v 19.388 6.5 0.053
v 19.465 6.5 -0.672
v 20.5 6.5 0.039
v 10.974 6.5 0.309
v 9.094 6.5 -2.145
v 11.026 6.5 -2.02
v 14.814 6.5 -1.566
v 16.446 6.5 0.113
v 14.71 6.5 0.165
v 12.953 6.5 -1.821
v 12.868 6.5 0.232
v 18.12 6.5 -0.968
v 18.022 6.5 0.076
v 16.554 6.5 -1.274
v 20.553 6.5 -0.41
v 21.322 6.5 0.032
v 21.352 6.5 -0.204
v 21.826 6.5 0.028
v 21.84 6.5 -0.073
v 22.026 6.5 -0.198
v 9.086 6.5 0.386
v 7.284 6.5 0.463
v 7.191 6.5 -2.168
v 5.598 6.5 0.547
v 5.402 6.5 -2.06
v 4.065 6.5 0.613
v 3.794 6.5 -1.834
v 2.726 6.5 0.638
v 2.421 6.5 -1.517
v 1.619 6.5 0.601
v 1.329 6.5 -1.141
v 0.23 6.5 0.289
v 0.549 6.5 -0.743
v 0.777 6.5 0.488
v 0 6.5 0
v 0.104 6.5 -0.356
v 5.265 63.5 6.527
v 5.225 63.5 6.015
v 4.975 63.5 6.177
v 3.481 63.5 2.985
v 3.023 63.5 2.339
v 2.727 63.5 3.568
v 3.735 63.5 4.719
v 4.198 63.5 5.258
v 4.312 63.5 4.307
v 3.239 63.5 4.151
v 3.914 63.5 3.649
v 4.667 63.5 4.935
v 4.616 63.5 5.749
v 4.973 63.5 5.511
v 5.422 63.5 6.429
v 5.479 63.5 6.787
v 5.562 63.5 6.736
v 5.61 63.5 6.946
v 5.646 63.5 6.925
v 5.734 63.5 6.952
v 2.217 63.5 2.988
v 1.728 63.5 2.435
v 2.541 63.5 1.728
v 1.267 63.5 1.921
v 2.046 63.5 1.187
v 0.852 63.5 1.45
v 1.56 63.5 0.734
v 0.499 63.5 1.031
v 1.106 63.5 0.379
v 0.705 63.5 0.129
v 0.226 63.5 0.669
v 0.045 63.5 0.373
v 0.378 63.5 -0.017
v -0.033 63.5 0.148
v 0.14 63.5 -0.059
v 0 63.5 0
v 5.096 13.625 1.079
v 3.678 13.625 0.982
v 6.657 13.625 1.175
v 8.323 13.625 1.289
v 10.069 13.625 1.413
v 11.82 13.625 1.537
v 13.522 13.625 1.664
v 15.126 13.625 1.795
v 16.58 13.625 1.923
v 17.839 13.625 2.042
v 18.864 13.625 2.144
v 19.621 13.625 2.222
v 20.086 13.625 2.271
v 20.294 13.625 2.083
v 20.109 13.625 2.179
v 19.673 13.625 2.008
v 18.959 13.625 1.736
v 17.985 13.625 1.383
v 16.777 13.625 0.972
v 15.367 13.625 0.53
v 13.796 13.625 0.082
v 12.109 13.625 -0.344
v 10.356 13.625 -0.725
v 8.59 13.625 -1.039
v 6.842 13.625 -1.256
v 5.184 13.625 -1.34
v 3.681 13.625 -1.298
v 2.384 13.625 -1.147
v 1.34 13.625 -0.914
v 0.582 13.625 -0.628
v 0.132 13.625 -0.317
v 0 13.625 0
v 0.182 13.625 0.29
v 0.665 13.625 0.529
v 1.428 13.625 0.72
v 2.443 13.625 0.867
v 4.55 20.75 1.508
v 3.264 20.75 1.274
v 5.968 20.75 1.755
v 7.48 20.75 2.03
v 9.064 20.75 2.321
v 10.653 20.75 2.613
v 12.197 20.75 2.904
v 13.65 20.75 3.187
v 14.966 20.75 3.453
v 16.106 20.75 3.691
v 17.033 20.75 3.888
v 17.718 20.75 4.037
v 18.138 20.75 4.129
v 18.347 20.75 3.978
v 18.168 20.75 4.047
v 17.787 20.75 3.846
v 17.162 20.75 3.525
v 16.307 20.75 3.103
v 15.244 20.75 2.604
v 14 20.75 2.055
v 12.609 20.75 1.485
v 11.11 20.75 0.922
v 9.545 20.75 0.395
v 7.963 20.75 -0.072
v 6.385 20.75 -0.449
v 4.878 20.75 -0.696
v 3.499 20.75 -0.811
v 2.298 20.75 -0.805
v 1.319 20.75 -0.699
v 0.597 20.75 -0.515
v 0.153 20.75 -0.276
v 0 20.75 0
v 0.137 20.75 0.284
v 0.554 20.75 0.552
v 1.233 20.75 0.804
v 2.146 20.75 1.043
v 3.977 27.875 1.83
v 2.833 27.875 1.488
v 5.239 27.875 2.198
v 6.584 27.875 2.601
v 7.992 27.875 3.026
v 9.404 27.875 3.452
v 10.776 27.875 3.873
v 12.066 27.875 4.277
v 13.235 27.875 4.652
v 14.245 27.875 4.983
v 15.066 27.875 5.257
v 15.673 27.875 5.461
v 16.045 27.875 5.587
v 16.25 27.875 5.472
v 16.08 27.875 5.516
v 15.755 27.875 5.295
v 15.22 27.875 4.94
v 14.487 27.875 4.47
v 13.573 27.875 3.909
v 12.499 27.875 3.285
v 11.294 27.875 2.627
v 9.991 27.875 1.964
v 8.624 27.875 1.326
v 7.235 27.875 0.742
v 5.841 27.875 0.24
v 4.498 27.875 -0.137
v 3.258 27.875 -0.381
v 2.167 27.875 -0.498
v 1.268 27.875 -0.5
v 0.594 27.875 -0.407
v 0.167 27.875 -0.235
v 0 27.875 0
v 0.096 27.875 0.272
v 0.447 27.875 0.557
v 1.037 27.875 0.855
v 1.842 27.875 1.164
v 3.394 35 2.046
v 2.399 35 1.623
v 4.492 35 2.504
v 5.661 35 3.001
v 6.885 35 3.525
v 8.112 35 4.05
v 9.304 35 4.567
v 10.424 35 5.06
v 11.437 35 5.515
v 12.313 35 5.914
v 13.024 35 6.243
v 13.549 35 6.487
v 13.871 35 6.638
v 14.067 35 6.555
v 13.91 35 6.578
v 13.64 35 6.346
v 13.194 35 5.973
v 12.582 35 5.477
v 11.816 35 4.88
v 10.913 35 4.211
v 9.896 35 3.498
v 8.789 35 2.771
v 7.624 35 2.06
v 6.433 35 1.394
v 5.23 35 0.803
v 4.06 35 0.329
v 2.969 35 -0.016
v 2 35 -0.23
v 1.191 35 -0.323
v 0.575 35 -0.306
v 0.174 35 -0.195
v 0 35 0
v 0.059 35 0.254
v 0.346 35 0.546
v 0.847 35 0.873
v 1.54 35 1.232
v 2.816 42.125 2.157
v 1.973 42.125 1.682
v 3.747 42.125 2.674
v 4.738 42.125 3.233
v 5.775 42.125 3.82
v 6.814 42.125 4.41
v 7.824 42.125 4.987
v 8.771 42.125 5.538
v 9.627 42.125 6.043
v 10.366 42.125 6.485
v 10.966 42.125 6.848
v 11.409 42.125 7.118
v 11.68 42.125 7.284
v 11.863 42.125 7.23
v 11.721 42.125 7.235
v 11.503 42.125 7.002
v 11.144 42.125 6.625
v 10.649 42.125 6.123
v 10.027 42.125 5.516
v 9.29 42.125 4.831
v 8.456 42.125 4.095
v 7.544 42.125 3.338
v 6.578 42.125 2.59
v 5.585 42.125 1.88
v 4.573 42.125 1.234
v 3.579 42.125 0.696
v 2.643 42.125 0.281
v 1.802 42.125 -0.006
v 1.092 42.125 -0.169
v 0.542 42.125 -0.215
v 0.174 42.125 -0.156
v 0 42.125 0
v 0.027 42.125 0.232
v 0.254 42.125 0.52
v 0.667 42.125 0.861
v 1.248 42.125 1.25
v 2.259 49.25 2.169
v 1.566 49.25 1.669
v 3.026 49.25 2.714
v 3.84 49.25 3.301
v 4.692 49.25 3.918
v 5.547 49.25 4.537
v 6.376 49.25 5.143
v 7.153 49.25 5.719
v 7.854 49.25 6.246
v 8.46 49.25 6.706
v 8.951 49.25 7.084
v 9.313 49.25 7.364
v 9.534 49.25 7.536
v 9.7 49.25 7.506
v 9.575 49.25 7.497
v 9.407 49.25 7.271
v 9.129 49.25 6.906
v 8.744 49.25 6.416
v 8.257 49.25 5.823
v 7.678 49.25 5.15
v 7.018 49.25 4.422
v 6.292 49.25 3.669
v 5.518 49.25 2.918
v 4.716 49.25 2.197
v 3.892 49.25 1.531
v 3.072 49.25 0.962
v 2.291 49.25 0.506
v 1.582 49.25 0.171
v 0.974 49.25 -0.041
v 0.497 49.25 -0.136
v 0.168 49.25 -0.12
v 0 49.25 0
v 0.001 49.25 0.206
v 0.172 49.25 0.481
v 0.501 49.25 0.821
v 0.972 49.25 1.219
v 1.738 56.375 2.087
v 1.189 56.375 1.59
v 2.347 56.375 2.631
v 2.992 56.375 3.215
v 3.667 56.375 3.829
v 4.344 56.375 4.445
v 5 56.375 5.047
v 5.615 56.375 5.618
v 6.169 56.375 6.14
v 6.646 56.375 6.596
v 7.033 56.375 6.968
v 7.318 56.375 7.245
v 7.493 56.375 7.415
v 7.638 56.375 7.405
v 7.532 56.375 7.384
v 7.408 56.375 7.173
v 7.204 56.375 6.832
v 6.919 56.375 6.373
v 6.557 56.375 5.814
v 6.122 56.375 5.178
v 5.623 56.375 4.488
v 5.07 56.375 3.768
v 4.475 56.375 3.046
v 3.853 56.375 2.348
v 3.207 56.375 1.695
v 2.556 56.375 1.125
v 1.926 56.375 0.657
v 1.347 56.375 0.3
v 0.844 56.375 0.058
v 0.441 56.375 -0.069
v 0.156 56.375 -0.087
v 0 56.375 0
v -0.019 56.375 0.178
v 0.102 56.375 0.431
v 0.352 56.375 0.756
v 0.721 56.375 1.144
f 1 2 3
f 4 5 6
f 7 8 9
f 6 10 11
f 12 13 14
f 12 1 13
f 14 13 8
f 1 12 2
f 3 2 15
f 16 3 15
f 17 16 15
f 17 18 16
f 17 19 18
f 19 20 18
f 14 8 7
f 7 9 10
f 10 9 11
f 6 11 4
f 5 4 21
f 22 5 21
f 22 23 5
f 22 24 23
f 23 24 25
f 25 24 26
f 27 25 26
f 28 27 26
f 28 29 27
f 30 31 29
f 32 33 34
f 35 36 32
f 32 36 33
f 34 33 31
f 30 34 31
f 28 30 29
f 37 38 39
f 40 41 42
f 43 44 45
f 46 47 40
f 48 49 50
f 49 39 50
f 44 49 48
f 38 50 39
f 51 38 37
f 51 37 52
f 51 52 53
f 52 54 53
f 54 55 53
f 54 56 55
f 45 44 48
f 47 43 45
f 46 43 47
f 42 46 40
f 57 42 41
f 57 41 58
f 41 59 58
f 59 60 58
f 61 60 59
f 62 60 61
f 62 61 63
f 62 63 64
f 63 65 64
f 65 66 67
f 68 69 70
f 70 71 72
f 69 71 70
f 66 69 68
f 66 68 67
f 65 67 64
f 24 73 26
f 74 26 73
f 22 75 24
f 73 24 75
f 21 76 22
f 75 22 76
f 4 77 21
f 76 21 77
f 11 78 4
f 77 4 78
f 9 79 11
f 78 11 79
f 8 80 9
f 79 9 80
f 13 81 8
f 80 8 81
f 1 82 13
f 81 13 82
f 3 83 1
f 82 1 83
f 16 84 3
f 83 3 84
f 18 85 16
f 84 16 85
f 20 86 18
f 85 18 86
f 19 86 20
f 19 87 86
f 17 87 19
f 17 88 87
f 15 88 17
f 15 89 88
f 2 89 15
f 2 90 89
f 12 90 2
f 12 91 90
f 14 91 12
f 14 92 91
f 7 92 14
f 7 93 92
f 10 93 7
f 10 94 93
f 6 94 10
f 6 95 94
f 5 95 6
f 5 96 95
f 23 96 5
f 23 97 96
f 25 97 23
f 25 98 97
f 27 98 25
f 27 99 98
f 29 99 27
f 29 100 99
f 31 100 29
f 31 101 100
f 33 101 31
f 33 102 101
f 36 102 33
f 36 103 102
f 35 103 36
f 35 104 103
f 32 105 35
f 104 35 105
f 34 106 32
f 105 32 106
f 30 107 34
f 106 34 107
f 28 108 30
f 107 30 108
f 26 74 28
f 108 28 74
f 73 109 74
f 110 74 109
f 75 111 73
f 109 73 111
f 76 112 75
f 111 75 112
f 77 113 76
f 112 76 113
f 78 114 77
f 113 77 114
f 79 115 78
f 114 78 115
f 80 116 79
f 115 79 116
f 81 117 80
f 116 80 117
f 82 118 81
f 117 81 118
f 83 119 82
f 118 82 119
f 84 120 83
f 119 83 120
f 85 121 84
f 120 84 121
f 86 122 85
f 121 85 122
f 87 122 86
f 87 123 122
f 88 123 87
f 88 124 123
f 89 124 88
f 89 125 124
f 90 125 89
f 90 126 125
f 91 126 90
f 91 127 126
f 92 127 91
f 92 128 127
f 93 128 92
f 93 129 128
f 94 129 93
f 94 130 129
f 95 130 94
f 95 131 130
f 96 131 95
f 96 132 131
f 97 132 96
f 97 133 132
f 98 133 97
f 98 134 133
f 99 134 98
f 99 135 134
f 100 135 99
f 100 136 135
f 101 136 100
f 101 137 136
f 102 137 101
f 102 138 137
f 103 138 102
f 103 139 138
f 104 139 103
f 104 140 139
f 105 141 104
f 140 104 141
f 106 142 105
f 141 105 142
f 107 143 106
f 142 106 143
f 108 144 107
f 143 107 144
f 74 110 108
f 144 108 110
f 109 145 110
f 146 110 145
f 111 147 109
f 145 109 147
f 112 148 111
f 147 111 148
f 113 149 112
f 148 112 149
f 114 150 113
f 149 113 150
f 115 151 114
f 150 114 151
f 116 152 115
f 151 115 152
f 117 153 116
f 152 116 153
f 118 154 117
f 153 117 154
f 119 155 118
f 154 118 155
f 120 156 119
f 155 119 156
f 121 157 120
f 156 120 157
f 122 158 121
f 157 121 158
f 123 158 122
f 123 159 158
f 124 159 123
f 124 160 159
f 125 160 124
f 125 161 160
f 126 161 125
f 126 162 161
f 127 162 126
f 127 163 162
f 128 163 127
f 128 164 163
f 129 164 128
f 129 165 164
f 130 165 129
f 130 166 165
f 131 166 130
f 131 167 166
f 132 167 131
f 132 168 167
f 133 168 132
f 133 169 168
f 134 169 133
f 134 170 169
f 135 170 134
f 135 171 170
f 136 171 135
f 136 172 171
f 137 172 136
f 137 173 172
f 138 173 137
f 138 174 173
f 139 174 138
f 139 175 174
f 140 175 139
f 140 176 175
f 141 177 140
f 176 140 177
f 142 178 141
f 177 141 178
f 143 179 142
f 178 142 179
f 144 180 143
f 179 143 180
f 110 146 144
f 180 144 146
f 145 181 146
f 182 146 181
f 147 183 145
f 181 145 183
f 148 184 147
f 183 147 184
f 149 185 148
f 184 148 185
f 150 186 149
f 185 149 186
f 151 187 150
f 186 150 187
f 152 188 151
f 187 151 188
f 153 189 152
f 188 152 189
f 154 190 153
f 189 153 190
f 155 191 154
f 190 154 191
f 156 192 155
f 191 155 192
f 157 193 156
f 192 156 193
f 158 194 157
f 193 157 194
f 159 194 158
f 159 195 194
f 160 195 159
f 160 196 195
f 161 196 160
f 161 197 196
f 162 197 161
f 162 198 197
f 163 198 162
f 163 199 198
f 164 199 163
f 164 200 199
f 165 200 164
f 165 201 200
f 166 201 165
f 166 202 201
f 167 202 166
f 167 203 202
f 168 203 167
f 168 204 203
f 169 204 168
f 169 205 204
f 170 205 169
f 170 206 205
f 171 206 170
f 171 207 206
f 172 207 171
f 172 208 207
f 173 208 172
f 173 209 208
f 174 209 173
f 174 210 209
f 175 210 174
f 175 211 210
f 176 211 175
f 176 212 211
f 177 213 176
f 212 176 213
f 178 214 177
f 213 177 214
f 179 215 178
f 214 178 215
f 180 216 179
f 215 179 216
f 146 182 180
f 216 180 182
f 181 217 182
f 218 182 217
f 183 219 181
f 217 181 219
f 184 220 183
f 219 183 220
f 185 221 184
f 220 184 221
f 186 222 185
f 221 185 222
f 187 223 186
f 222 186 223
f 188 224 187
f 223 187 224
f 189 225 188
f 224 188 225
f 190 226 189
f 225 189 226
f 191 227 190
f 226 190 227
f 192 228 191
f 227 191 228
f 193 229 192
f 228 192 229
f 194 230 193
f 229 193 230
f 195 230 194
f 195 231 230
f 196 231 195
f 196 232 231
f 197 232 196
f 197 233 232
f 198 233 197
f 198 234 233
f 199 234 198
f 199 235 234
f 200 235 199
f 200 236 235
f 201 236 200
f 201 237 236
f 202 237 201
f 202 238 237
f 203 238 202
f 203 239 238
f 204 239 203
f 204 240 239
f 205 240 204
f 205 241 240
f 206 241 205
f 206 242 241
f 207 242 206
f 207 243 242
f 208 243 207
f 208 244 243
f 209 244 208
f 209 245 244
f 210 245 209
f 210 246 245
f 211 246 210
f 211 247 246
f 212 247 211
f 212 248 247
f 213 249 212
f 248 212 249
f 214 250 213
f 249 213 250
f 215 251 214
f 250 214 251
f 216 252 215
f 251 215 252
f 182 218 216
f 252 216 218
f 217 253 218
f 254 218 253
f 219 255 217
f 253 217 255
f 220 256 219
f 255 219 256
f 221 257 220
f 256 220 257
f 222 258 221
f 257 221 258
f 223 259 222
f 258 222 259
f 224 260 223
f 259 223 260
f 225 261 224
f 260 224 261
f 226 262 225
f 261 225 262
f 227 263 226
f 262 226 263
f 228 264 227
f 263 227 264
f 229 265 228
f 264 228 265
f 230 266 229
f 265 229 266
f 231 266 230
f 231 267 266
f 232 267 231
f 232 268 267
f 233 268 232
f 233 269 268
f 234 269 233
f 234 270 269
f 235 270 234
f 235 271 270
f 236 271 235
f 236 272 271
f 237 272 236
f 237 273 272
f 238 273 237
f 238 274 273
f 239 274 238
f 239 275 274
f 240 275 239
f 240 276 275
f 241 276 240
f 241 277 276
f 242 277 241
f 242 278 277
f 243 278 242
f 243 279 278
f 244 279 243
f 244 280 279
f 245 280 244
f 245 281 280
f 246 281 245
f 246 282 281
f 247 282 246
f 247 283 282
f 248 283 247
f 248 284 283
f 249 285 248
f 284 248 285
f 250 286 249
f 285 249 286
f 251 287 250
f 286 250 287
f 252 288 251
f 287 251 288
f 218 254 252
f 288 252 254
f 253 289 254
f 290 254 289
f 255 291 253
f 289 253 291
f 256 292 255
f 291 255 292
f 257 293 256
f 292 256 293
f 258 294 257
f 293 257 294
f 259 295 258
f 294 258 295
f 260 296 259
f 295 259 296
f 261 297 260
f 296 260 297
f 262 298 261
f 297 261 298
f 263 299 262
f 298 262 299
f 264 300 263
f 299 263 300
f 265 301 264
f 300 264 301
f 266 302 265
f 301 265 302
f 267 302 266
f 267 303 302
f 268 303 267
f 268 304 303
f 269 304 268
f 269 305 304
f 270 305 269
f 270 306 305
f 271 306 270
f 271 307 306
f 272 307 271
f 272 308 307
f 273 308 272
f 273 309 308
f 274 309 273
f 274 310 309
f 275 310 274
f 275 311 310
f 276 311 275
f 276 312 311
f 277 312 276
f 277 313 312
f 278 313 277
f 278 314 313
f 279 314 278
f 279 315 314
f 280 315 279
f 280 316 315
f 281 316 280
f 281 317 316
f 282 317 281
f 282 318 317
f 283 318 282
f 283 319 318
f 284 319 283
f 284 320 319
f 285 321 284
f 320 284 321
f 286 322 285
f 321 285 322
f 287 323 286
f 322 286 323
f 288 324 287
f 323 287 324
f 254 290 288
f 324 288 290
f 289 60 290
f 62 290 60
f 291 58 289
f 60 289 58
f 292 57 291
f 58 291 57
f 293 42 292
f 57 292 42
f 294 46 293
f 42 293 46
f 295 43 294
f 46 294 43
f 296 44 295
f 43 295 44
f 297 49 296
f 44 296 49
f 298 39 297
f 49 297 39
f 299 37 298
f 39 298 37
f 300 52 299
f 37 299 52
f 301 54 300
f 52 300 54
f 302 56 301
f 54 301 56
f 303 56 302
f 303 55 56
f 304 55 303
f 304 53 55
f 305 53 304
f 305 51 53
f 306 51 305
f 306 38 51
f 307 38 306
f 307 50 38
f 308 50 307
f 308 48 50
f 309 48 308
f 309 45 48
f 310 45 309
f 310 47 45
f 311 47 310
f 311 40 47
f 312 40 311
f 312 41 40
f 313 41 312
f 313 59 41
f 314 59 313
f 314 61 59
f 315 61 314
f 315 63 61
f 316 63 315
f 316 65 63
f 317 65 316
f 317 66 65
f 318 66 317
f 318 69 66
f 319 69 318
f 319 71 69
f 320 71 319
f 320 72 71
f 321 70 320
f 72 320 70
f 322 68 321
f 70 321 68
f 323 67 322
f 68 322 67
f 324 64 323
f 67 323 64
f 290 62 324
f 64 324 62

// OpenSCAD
// file: naca.scad
// NACA 4-digit sections (Abbott & von Doenhoff). Cosine-sampled once.

function naca_xb(i, n) = 0.5 * (1 - cos(180 * i / n));

function naca_yt(xb, t) =
  let (x = max(xb, 0))
    5 * t * (
      0.2969 * sqrt(x)
      - 0.1260 * x
      - 0.3516 * x * x
      + 0.2843 * x * x * x
      - 0.1015 * x * x * x * x
    );

function naca_yc(xb, m, p) =
  (m == 0) ? 0
  : (xb < p)
    ? (m / (p * p)) * (2 * p * xb - xb * xb)
    : (m / ((1 - p) * (1 - p))) * ((1 - 2 * p) + 2 * p * xb - xb * xb);

function naca_dyc(xb, m, p) =
  (m == 0) ? 0
  : (xb < p)
    ? (2 * m / (p * p)) * (p - xb)
    : (2 * m / ((1 - p) * (1 - p))) * (p - xb);

function naca_point(xb, m, p, t, chord, side) =
  let (
    yt = naca_yt(xb, t) * chord,
    yc = naca_yc(xb, m, p) * chord,
    th = atan(naca_dyc(xb, m, p)),
    yt_use = (xb >= 0.999) ? 0.2 : yt
  )
    side > 0
      ? [xb * chord - yt_use * sin(th), yc + yt_use * cos(th)]
      : [xb * chord + yt_use * sin(th), yc - yt_use * cos(th)];

function naca_profile(m, p, t, chord, n = 24) =
  concat(
    [for (i = [0:n]) naca_point(naca_xb(i, n), m, p, t, chord, 1)],
    [for (i = [n - 1:-1:1]) naca_point(naca_xb(i, n), m, p, t, chord, -1)]
  );

function concat_all(list, i = 0) =
  i >= len(list) ? [] : concat(list[i], concat_all(list, i + 1));

function fuselage_ring(i, ns, nc, chord, width, m, p, t, nose_x) =
  let (
    xb = 0.5 * (1 - cos(180 * i / (ns + 1))),
    yt = naca_yt(xb, t) * chord,
    yc = naca_yc(xb, m, p) * chord,
    yt_ref = naca_yt(0.3, 1),
    yw = (width / 2) * max(naca_yt(xb, 1) / yt_ref, 0.04),
    xw = nose_x - xb * chord
  )
    [
      for (j = [0:nc - 1])
        let (a = 360 * j / nc)
          [xw, yw * cos(a), yc + yt * sin(a)]
    ];

function fuselage_points(ns, nc, chord, width, m, p, t, nose_x) =
  concat(
    [[nose_x, 0, 0]],
    concat_all([
      for (i = [1:ns])
        fuselage_ring(i, ns, nc, chord, width, m, p, t, nose_x)
    ]),
    [[nose_x - chord, 0, 0]]
  );

function ring_quads(a, b, nc) =
  [
    for (j = [0:nc - 1])
      [a + j, a + (j + 1) % nc, b + (j + 1) % nc, b + j]
  ];

function fuselage_faces(ns, nc) =
  let (te = 1 + ns * nc)
    concat(
      [for (j = [0:nc - 1]) [0, 1 + (j + 1) % nc, 1 + j]],
      concat_all([
        for (i = [0:ns - 2])
          ring_quads(1 + i * nc, 1 + (i + 1) * nc, nc)
      ]),
      [
        for (j = [0:nc - 1])
          [te, 1 + (ns - 1) * nc + j, 1 + (ns - 1) * nc + (j + 1) % nc]
      ]
    );

module naca_airfoil(m, p, t, chord, n = 24) {
  polygon(naca_profile(m, p, t, chord, n), convexity = 6);
}

// Half-profile [r, z] of a NACA body of revolution. Parts revolve it
// themselves: faces made inside a helper module export under that module's
// name, so the part's own cuts would not weld to them.
function naca_revolution_profile(t, chord, n = 24) =
  concat(
    [[0.02, 0]],
    [
      for (i = [0:n])
        let (pt = naca_point(naca_xb(i, n), 0, 0.4, t, chord, 1))
          [max(pt[1], 0.05), pt[0]]
    ],
    [[0.02, chord]]
  );

module naca_fuselage_body(m, p, t, chord, width, nose_x, ns = 16, nc = 12) {
  polyhedron(
    points = fuselage_points(ns, nc, chord, width, m, p, t, nose_x),
    faces = fuselage_faces(ns, nc),
    convexity = 12
  );
}
// main file
use <naca.scad>

$fa = 3;
$fs = 0.6;

module prop_blade() {
  color("#e8e8e8")
    translate([0, 6.5, 0])
      rotate([-90, 0, 0])
        linear_extrude(
          height = 57,
          twist = 51,
          scale = 9 / 22,
          slices = 8,
          convexity = 6
        )
          naca_airfoil(0.04, 0.4, 0.12, 22, 18);
}

prop_blade();
